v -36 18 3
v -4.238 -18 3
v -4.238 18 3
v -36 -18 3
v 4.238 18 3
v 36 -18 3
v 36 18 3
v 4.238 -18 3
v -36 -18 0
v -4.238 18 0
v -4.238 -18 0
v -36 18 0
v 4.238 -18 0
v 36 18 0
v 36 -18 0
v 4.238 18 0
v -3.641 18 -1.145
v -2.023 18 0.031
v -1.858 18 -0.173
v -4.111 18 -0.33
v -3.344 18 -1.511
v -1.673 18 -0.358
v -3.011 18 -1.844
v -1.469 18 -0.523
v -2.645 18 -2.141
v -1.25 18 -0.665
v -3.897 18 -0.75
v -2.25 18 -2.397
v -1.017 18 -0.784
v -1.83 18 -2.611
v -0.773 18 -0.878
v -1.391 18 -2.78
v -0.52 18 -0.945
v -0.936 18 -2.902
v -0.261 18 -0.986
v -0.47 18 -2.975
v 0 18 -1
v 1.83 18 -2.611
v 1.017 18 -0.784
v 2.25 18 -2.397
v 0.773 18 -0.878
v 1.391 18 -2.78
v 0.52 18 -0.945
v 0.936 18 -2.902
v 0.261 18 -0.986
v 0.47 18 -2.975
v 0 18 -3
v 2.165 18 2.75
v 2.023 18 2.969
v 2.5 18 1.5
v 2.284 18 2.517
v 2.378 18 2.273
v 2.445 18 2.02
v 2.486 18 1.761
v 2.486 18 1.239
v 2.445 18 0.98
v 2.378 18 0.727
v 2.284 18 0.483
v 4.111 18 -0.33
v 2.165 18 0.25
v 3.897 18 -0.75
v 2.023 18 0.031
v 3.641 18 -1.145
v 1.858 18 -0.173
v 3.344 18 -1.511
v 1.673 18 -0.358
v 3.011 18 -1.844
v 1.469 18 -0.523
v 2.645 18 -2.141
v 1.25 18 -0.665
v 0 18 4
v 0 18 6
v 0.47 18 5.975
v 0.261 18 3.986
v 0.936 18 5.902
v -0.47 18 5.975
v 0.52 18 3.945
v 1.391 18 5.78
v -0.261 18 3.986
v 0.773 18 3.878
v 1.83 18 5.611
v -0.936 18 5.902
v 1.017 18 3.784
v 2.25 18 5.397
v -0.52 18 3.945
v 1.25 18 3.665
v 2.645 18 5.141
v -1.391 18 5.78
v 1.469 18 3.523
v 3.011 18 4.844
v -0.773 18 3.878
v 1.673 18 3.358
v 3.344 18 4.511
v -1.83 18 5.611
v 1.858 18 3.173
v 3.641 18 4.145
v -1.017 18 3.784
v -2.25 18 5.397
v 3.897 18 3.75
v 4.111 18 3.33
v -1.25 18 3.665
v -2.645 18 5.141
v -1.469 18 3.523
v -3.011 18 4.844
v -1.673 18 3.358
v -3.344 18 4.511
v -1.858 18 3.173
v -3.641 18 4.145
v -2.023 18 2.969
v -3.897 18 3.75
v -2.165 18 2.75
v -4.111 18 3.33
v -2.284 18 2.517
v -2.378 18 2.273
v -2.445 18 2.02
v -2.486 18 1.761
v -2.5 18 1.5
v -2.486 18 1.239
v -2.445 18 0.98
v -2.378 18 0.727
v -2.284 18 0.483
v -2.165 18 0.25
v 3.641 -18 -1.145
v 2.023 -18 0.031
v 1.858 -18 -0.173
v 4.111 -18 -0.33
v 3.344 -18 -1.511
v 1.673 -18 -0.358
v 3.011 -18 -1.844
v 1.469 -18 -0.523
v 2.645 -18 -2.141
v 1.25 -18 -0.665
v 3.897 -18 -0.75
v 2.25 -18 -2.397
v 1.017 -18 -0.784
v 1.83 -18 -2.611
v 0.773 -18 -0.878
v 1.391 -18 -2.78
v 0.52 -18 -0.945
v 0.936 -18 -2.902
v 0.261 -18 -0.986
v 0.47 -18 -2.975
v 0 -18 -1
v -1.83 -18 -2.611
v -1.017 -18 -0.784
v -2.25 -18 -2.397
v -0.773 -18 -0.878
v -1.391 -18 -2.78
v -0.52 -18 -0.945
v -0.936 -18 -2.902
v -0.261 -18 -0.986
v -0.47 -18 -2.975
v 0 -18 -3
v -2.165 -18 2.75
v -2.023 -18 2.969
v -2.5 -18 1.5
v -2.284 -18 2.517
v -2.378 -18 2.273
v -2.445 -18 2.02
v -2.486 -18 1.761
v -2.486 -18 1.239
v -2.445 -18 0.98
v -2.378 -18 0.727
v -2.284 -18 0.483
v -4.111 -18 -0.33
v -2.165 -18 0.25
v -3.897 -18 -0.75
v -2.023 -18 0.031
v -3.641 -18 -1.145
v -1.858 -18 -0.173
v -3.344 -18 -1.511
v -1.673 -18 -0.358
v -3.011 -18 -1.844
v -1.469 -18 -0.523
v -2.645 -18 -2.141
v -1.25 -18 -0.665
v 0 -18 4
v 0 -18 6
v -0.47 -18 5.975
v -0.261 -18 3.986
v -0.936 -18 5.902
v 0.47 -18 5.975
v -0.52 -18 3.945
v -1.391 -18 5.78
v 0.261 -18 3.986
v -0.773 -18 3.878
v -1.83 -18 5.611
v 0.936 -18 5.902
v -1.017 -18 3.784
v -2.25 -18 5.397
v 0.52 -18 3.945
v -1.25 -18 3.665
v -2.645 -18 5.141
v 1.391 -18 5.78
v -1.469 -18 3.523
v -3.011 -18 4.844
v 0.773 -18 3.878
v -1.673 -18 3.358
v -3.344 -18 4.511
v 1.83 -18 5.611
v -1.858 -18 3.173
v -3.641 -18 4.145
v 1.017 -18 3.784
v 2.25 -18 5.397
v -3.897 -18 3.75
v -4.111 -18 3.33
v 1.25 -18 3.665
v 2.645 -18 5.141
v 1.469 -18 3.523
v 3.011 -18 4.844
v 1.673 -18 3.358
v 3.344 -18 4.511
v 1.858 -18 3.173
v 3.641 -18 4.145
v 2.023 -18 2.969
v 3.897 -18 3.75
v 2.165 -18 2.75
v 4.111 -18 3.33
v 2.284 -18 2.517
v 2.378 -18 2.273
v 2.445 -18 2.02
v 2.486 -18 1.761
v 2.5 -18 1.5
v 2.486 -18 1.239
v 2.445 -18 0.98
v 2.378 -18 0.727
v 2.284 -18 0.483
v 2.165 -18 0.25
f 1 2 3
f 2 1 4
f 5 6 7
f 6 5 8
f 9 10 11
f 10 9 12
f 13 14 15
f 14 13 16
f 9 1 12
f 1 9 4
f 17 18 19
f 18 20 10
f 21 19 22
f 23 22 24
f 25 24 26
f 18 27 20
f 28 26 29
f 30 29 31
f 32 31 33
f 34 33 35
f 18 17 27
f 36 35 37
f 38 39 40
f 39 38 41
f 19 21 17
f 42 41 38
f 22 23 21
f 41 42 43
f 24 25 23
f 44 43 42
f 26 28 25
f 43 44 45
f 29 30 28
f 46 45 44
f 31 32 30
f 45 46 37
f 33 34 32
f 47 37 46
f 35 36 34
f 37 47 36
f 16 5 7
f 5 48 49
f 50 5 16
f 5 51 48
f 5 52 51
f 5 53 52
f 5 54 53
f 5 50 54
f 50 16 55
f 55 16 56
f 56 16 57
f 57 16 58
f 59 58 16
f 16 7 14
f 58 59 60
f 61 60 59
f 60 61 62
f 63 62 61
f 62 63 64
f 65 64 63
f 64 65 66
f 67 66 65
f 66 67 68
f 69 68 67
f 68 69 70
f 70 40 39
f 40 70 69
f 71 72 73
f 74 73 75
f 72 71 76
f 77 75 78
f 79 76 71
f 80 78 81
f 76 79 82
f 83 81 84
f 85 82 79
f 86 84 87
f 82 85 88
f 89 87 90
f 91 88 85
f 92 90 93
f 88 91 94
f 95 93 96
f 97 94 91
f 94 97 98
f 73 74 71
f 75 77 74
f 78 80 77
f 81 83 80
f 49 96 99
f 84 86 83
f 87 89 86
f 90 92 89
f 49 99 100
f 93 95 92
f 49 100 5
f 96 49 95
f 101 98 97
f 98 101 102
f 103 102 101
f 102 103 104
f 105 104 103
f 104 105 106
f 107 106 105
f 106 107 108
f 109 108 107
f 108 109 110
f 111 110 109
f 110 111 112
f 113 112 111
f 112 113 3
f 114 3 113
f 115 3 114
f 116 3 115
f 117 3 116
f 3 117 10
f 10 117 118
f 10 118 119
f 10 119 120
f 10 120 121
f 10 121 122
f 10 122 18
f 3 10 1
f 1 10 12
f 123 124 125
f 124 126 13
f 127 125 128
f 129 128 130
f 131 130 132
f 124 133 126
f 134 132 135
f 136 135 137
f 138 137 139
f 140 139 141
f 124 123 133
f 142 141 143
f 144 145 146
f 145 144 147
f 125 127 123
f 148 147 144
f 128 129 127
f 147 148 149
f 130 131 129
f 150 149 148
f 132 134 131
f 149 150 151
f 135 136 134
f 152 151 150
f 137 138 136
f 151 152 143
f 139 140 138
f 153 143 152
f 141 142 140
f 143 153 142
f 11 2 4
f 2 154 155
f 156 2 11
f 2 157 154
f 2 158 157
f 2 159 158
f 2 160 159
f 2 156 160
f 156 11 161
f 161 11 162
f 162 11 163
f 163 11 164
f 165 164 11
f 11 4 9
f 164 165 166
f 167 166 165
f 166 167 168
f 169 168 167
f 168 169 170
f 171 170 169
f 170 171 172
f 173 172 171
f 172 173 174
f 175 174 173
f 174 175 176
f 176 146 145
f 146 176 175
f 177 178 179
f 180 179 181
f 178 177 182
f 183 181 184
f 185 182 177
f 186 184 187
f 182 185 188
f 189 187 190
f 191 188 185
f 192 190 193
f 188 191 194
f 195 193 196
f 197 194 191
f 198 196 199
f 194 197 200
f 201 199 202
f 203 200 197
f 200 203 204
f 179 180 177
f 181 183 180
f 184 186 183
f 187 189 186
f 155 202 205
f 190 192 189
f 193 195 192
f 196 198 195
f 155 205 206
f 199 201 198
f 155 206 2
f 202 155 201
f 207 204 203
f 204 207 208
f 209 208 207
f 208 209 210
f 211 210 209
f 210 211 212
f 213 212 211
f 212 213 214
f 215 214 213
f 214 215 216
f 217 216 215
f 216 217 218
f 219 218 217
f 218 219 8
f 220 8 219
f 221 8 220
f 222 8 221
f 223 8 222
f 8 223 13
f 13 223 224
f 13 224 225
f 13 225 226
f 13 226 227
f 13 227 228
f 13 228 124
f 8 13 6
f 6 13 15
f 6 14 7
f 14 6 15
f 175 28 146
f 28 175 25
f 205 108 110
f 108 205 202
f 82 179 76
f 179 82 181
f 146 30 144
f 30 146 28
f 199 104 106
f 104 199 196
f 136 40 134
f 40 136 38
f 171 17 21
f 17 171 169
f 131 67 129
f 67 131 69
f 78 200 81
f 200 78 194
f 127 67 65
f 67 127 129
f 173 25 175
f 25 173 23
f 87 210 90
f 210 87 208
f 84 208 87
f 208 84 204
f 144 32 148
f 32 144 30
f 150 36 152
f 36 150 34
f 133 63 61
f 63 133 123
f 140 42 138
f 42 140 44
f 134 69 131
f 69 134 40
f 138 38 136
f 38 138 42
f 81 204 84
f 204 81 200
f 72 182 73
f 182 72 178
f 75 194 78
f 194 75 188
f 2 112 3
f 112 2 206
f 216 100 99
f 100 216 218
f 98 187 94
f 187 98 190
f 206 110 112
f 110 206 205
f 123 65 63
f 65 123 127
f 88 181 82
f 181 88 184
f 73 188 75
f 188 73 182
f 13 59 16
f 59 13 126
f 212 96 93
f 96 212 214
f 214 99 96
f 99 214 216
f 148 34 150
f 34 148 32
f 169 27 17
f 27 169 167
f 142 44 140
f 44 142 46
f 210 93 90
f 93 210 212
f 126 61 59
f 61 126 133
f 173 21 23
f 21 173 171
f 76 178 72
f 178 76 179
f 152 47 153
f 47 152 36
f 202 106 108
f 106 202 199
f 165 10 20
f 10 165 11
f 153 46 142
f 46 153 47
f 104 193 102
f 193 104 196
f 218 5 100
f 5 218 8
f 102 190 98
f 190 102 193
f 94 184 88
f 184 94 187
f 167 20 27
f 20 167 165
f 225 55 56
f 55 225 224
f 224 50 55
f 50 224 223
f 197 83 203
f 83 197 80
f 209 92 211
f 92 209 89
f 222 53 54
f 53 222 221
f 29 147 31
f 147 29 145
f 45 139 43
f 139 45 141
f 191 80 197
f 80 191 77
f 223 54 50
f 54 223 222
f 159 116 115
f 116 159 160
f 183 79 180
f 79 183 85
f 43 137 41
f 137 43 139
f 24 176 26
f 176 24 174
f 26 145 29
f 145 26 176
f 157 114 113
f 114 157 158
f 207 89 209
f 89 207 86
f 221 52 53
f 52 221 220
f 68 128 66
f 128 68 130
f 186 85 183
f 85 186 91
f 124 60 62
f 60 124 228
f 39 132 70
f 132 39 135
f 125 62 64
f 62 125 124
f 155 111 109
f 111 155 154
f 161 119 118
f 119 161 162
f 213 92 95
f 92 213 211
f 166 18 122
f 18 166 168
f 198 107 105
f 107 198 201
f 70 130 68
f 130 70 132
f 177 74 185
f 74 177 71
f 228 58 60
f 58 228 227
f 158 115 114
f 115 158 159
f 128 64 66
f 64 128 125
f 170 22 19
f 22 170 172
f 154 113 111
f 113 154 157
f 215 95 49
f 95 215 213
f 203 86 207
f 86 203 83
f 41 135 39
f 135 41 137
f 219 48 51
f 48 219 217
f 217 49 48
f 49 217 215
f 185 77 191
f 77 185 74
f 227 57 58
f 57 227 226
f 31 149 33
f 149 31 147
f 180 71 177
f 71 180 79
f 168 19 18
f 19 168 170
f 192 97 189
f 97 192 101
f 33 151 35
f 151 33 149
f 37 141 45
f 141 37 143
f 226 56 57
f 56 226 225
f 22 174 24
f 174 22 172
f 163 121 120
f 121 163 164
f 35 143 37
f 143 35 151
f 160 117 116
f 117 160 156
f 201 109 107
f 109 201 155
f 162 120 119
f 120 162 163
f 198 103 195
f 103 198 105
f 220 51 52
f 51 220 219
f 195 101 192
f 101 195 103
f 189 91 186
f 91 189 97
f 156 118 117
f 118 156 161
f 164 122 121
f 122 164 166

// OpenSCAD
// Compact plate hinge.
$fn = 60;
eps = 0.02;
leaf_l = 36;
width = 36;
pin_d = 5;
leaf_t = 3;
difference() {
    union() {
        translate([-leaf_l,-width/2,0]) cube([leaf_l,width,leaf_t]);
        translate([0,-width/2,0]) cube([leaf_l,width,leaf_t]);
        translate([0,-width/2,leaf_t/2]) rotate([-90,0,0]) cylinder(d=pin_d+4,h=width);
    }
    translate([0,-width/2-eps,leaf_t/2]) rotate([-90,0,0]) cylinder(d=pin_d,h=width+2*eps);
}
